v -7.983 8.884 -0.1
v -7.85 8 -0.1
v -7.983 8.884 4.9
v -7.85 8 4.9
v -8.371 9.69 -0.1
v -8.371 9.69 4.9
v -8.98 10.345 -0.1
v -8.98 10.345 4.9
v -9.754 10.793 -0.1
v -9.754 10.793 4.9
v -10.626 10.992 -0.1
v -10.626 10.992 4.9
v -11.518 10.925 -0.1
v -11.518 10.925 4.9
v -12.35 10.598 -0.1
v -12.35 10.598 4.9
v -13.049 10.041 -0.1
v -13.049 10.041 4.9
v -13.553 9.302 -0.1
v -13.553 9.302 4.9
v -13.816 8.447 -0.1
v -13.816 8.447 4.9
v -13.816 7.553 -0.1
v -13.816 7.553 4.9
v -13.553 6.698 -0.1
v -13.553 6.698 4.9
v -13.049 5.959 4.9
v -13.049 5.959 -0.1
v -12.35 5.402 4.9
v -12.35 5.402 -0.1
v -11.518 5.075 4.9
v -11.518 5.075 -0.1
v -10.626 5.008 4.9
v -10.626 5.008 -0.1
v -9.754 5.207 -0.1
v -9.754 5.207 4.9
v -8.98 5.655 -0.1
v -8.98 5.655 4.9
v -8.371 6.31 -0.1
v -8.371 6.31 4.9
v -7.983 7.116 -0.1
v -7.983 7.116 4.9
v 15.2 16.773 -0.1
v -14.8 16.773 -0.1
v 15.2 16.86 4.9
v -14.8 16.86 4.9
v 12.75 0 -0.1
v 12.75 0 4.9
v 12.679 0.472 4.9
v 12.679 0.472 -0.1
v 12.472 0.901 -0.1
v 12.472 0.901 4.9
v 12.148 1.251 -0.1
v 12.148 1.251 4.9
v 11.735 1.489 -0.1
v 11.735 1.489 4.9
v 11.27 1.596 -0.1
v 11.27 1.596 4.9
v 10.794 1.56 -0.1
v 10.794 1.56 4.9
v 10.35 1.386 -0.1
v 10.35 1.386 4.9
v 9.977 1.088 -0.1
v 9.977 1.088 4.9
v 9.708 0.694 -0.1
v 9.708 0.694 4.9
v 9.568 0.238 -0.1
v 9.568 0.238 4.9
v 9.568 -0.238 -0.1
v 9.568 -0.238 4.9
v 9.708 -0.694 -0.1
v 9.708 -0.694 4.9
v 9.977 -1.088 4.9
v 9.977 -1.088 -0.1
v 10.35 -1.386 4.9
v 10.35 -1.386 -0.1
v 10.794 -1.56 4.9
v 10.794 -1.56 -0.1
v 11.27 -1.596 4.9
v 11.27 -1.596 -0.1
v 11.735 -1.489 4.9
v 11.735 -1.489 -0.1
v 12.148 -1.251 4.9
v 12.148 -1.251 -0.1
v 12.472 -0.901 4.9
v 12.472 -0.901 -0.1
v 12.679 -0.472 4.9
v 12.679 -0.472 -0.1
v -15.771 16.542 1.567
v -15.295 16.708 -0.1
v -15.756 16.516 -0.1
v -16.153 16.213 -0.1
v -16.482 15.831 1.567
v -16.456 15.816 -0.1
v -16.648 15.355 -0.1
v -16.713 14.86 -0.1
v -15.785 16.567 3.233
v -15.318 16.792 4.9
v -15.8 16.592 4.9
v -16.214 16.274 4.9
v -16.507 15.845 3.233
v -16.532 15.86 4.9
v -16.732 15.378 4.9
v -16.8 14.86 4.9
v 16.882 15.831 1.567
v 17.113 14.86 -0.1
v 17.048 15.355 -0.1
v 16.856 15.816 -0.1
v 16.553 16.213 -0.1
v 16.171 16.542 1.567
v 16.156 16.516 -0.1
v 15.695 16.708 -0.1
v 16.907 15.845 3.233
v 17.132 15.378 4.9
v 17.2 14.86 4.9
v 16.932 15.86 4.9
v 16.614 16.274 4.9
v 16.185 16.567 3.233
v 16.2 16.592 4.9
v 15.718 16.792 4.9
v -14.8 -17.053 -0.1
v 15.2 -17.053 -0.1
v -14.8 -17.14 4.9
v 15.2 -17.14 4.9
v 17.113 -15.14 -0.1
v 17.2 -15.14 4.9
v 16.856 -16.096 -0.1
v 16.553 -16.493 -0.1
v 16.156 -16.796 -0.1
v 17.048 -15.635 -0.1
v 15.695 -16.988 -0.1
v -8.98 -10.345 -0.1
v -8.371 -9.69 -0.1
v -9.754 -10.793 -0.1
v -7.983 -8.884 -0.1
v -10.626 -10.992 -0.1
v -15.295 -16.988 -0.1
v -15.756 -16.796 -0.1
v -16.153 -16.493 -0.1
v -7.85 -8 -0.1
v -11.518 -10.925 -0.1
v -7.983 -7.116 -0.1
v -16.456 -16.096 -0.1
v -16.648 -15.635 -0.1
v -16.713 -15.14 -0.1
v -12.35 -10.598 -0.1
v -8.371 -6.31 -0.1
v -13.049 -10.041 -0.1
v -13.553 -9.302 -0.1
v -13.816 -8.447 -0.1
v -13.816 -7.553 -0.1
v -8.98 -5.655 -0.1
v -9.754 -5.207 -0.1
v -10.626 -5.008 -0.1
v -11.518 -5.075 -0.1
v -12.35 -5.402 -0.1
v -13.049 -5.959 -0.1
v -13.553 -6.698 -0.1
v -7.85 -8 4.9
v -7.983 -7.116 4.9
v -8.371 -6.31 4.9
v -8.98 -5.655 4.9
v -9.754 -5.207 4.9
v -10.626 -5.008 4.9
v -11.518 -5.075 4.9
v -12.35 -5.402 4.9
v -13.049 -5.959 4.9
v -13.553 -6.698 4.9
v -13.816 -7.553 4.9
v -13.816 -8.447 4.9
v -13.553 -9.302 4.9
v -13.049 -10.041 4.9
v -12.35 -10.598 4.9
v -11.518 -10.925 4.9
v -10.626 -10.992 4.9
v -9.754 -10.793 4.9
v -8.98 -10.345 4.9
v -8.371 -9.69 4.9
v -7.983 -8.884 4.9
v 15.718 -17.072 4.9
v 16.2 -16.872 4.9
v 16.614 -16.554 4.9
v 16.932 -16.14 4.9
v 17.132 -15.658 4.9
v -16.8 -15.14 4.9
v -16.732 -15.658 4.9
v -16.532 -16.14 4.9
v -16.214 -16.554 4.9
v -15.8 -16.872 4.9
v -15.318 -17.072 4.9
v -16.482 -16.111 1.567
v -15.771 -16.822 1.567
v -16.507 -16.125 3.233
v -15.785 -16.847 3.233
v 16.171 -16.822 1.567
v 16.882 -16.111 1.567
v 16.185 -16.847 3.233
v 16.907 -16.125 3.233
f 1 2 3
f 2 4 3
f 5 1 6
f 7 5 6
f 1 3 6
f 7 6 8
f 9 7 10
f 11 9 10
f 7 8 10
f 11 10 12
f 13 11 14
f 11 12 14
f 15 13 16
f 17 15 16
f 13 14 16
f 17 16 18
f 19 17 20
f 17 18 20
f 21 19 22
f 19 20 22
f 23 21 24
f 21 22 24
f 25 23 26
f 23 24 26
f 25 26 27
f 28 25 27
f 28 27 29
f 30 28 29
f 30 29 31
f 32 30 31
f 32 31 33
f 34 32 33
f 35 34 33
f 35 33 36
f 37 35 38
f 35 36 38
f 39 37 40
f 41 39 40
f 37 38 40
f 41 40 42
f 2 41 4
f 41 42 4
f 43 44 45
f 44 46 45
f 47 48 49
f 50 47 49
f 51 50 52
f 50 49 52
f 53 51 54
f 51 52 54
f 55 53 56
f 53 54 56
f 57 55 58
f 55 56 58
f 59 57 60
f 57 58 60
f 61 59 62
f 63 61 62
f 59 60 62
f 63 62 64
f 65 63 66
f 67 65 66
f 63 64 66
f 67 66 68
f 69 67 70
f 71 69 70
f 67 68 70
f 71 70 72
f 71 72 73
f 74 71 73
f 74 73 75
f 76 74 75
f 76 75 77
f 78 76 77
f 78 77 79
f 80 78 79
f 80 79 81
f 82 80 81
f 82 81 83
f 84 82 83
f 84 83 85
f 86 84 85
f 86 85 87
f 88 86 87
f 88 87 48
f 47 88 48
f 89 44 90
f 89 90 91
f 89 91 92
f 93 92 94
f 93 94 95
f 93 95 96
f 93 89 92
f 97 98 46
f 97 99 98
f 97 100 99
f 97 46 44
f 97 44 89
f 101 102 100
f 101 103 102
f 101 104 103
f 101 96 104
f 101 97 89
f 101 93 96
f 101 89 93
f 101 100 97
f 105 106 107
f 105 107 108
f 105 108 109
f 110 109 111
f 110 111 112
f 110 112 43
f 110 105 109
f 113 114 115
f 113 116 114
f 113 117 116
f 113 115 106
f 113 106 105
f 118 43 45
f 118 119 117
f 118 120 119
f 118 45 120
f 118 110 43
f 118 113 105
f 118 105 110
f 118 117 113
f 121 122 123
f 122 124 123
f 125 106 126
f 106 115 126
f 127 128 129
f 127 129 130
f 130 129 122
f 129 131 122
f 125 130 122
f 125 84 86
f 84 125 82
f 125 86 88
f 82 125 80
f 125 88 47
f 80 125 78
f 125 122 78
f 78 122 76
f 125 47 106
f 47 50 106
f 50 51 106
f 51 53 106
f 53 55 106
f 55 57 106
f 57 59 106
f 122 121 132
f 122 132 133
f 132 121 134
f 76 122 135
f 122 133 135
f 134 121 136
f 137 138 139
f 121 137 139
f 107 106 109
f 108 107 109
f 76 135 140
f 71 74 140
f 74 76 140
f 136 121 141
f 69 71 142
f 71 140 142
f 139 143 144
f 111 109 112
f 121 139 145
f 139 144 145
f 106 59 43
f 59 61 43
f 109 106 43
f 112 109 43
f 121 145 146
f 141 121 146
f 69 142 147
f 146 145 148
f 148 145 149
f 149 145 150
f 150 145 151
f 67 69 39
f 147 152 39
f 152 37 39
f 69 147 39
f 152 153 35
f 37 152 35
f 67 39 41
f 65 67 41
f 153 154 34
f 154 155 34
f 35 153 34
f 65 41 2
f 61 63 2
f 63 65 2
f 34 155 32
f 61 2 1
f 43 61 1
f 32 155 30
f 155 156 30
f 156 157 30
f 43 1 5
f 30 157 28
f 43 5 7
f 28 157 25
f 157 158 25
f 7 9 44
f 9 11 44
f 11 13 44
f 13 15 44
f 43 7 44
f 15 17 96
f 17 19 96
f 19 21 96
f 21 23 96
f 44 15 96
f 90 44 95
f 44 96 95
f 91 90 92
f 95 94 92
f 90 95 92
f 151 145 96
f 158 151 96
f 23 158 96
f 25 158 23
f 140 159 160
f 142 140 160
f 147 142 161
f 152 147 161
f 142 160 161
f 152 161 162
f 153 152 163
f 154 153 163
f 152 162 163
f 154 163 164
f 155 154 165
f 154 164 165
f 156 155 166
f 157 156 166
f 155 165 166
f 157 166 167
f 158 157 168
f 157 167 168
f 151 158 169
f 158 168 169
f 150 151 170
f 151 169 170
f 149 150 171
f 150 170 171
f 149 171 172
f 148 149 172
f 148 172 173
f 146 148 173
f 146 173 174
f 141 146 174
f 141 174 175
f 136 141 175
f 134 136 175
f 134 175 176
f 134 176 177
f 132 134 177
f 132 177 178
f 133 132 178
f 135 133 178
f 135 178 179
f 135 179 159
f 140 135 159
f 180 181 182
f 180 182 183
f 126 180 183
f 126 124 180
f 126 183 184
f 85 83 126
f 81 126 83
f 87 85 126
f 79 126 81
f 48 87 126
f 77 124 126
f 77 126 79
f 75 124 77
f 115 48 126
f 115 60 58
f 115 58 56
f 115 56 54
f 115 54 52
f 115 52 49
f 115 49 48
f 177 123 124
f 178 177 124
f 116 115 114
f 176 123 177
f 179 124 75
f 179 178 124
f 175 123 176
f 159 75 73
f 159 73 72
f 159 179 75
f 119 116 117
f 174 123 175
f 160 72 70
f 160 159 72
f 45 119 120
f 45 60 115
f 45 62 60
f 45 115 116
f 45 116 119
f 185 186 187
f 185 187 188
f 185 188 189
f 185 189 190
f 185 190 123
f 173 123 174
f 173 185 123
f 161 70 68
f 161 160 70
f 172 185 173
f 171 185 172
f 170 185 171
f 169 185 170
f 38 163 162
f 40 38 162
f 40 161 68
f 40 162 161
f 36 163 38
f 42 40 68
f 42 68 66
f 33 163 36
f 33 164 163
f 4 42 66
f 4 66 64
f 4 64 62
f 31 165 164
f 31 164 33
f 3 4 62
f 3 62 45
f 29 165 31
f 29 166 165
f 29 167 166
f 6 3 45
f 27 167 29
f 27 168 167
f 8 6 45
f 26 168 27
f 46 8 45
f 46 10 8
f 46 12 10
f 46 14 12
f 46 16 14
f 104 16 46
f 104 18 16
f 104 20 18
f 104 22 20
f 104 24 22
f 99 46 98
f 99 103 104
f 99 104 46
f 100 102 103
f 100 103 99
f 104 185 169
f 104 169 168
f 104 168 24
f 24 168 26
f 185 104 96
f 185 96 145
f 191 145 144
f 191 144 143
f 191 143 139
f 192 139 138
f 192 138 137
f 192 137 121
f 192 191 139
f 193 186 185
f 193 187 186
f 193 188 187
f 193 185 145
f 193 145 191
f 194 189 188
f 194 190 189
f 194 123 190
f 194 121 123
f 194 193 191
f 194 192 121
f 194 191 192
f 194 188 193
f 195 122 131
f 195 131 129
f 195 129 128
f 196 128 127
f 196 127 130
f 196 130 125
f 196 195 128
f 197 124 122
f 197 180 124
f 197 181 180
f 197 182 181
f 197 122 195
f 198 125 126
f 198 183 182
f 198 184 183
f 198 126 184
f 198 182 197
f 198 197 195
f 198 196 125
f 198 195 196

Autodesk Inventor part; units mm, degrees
ref_plane "YZ Plane" through (0, 0, 0) normal (1, 0, 0) x (0, 1, 0)
ref_plane "XZ Plane" through (0, 0, 0) normal (0, 1, 0) x (-1, 0, 0)
ref_plane "XY Plane" through (0, 0, 0) normal (0, 0, 1) x (1, 0, 0)
ref_plane "Work Plane1" through (15.4052, 15.0652, 4.9) normal (0, 0, 1) x (0, 1, 0)
sketch "Sketch1" plane through (15.4052, 15.0652, 4.9) normal (0, 0, 1) x (0, 1, 0)
  circle A0 centre (5.7948, 15.4052) radius 2.5 projected
  circle A1 centre (-15.6052, -5.7948) radius 2.5 projected
  line L0 (-20.0856, 39.0762) -> (-20.0856, 40.2052) projected
  line L1 (-20.0856, 40.2052) -> (-38.2052, 40.2052) projected
  arc A2 (-38.2052, 40.2052) -> (-40.2052, 38.2052) centre (-38.2052, 38.2052) ccw projected
  line L2 (-40.2052, 20.2953) -> (-40.2052, 38.2052) projected
  line L3 (-40.2052, 20.2953) -> (-39.0783, 20.2953) projected
  arc A3 (-39.0783, 20.2953) -> (-38.6768, 20.6232) centre (-39.0783, 20.7051) ccw projected
  arc A4 (-34.5391, 20.2052) -> (-38.6768, 20.6232) centre (-36.6291, 20.2052) ccw projected
  line L4 (-34.5391, 20.2052) -> (-34.5391, 10.4067) projected
  arc A5 (-38.647, 9.8643) -> (-34.5391, 10.4067) centre (-36.6023, 10.2052) ccw projected
  line L5 (-38.647, 9.8643) -> (-38.6775, 9.9849) projected
  arc A6 (-38.6775, 9.9849) -> (-39.0762, 10.3249) centre (-39.083, 9.9131) ccw projected
  line L6 (-39.0762, 10.3249) -> (-40.2052, 10.3249) projected
  line L7 (-40.2052, -7.7948) -> (-40.2052, 10.3249) projected
  arc A7 (-40.2052, -7.7948) -> (-38.2052, -9.7948) centre (-38.2052, -7.7948) ccw projected
  line L8 (-38.2052, -9.7948) -> (-20.2052, -9.7948) projected
  line L9 (-20.2052, -9.7948) -> (-20.2052, -10.8453) projected
  arc A8 (-20.6052, -11.3352) -> (-20.2052, -10.8453) centre (-20.7052, -10.8453) ccw projected
  arc A9 (-20.6052, -11.3352) -> (-20.2052, -15.2948) centre (-20.2052, -13.2948) ccw projected
  line L10 (-20.2052, -15.2948) -> (-10.2052, -15.2948) projected
  arc A10 (-10.2052, -15.2948) -> (-9.8052, -11.3352) centre (-10.2052, -13.2948) ccw projected
  arc A11 (-10.2052, -10.8453) -> (-9.8052, -11.3352) centre (-9.7052, -10.8453) ccw projected
  line L11 (-10.2052, -10.8453) -> (-10.2052, -9.7948) projected
  line L12 (-10.2052, -9.7948) -> (7.7948, -9.7948) projected
  arc A12 (7.7948, -9.7948) -> (9.7948, -7.7948) centre (7.7948, -7.7948) ccw projected
  line L13 (9.7948, 10.2052) -> (9.7948, -7.7948) projected
  line L14 (9.7948, 10.2052) -> (10.8453, 10.2052) projected
  arc A13 (11.3352, 9.8052) -> (10.8453, 10.2052) centre (10.8453, 9.7052) ccw projected
  arc A14 (11.3352, 9.8052) -> (15.2948, 10.2052) centre (13.2948, 10.2052) ccw projected
  line L15 (15.2948, 10.2052) -> (15.2948, 20.2052) projected
  arc A15 (15.2948, 20.2052) -> (11.3352, 20.6052) centre (13.2948, 20.2052) ccw projected
  arc A16 (10.8453, 20.2052) -> (11.3352, 20.6052) centre (10.8453, 20.7052) ccw projected
  line L16 (10.8453, 20.2052) -> (9.7948, 20.2052) projected
  line L17 (9.7948, 38.2052) -> (9.7948, 20.2052) projected
  arc A17 (9.7948, 38.2052) -> (7.7948, 40.2052) centre (7.7948, 38.2052) ccw projected
  line L18 (7.7948, 40.2052) -> (-10.1151, 40.2052) projected
  line L19 (-10.1151, 40.2052) -> (-10.1151, 39.0783) projected
  arc A18 (-10.1151, 39.0783) -> (-9.7873, 38.6768) centre (-9.7054, 39.0783) ccw projected
  arc A19 (-10.2052, 34.5391) -> (-9.7873, 38.6768) centre (-10.2052, 36.6291) ccw projected
  line L20 (-10.2052, 34.5391) -> (-20.0038, 34.5391) projected
  arc A20 (-20.5462, 38.647) -> (-20.0038, 34.5391) centre (-20.2052, 36.6023) ccw projected
  line L21 (-20.5462, 38.647) -> (-20.4256, 38.6775) projected
  arc A21 (-20.4256, 38.6775) -> (-20.0856, 39.0762) centre (-20.4974, 39.083) ccw projected
  line L22 (-0.2052, 32.2052) -> (-30.2052, 32.2052) projected
  arc A22 (1.7948, 30.2052) -> (-0.2052, 32.2052) centre (-0.2052, 30.2052) ccw projected
  line L23 (1.7948, 30.2052) -> (1.7948, 0.2052) projected
  arc A23 (-0.2052, -1.7948) -> (1.7948, 0.2052) centre (-0.2052, 0.2052) ccw projected
  line L24 (-0.2052, -1.7948) -> (-30.2052, -1.7948) projected
  arc A24 (-32.2052, 0.2052) -> (-30.2052, -1.7948) centre (-30.2052, 0.2052) ccw projected
  line L25 (-32.2052, 0.2052) -> (-32.2052, 30.2052) projected
  arc A25 (-30.2052, 32.2052) -> (-32.2052, 30.2052) centre (-30.2052, 30.2052) ccw projected
  circle A26 centre (-35.2052, 35.2052) radius 2.425 projected
  circle A27 centre (-29.7052, 36.0052) radius 2.65 projected
  circle A28 centre (-36.0052, 29.7052) radius 2.65 projected
  circle A29 centre (-35.2052, -4.7948) radius 2.425 projected
  circle A30 centre (-29.7052, -5.5948) radius 2.65 projected
  circle A31 centre (-36.0052, 0.7052) radius 2.65 projected
  circle A32 centre (4.7948, 35.2052) radius 2.425 projected
  circle A33 centre (-0.7052, 36.0052) radius 2.65 projected
  circle A34 centre (5.5948, 29.7052) radius 2.65 projected
  circle A35 centre (5.5948, 0.7052) radius 2.65 projected
  circle A36 centre (-0.7052, -5.5948) radius 2.65 projected
  circle A37 centre (4.7948, -4.7948) radius 2.425 projected
  point P0 (-15.0652, 15.4052)
extrude "Extrusion1" add sketch "Sketch1" against normal blind 5 draft -1 contours A22 L23 A23 L24 A24 L25 A25 L22
sketch "Sketch2" plane through (15.4052, 15.0652, 4.9) normal (0, 0, 1) x (1, 0, 0)
  circle A0 centre (-26.2552, -7.0652) radius 3 projected
  circle A1 centre (-26.2552, -23.0652) radius 3 projected
  circle A2 centre (-4.2552, -15.0652) radius 1.6 projected
  line L0 (-50.1952, -15.0652) -> (19.3848, -15.0652)
  point P0 (-15.4052, -15.0652)
extrude "Extrusion2" cut sketch "Sketch2" against normal through all
properties part number "30_Cube_Z_Focus_Drylin_NEMA_counterplate"
